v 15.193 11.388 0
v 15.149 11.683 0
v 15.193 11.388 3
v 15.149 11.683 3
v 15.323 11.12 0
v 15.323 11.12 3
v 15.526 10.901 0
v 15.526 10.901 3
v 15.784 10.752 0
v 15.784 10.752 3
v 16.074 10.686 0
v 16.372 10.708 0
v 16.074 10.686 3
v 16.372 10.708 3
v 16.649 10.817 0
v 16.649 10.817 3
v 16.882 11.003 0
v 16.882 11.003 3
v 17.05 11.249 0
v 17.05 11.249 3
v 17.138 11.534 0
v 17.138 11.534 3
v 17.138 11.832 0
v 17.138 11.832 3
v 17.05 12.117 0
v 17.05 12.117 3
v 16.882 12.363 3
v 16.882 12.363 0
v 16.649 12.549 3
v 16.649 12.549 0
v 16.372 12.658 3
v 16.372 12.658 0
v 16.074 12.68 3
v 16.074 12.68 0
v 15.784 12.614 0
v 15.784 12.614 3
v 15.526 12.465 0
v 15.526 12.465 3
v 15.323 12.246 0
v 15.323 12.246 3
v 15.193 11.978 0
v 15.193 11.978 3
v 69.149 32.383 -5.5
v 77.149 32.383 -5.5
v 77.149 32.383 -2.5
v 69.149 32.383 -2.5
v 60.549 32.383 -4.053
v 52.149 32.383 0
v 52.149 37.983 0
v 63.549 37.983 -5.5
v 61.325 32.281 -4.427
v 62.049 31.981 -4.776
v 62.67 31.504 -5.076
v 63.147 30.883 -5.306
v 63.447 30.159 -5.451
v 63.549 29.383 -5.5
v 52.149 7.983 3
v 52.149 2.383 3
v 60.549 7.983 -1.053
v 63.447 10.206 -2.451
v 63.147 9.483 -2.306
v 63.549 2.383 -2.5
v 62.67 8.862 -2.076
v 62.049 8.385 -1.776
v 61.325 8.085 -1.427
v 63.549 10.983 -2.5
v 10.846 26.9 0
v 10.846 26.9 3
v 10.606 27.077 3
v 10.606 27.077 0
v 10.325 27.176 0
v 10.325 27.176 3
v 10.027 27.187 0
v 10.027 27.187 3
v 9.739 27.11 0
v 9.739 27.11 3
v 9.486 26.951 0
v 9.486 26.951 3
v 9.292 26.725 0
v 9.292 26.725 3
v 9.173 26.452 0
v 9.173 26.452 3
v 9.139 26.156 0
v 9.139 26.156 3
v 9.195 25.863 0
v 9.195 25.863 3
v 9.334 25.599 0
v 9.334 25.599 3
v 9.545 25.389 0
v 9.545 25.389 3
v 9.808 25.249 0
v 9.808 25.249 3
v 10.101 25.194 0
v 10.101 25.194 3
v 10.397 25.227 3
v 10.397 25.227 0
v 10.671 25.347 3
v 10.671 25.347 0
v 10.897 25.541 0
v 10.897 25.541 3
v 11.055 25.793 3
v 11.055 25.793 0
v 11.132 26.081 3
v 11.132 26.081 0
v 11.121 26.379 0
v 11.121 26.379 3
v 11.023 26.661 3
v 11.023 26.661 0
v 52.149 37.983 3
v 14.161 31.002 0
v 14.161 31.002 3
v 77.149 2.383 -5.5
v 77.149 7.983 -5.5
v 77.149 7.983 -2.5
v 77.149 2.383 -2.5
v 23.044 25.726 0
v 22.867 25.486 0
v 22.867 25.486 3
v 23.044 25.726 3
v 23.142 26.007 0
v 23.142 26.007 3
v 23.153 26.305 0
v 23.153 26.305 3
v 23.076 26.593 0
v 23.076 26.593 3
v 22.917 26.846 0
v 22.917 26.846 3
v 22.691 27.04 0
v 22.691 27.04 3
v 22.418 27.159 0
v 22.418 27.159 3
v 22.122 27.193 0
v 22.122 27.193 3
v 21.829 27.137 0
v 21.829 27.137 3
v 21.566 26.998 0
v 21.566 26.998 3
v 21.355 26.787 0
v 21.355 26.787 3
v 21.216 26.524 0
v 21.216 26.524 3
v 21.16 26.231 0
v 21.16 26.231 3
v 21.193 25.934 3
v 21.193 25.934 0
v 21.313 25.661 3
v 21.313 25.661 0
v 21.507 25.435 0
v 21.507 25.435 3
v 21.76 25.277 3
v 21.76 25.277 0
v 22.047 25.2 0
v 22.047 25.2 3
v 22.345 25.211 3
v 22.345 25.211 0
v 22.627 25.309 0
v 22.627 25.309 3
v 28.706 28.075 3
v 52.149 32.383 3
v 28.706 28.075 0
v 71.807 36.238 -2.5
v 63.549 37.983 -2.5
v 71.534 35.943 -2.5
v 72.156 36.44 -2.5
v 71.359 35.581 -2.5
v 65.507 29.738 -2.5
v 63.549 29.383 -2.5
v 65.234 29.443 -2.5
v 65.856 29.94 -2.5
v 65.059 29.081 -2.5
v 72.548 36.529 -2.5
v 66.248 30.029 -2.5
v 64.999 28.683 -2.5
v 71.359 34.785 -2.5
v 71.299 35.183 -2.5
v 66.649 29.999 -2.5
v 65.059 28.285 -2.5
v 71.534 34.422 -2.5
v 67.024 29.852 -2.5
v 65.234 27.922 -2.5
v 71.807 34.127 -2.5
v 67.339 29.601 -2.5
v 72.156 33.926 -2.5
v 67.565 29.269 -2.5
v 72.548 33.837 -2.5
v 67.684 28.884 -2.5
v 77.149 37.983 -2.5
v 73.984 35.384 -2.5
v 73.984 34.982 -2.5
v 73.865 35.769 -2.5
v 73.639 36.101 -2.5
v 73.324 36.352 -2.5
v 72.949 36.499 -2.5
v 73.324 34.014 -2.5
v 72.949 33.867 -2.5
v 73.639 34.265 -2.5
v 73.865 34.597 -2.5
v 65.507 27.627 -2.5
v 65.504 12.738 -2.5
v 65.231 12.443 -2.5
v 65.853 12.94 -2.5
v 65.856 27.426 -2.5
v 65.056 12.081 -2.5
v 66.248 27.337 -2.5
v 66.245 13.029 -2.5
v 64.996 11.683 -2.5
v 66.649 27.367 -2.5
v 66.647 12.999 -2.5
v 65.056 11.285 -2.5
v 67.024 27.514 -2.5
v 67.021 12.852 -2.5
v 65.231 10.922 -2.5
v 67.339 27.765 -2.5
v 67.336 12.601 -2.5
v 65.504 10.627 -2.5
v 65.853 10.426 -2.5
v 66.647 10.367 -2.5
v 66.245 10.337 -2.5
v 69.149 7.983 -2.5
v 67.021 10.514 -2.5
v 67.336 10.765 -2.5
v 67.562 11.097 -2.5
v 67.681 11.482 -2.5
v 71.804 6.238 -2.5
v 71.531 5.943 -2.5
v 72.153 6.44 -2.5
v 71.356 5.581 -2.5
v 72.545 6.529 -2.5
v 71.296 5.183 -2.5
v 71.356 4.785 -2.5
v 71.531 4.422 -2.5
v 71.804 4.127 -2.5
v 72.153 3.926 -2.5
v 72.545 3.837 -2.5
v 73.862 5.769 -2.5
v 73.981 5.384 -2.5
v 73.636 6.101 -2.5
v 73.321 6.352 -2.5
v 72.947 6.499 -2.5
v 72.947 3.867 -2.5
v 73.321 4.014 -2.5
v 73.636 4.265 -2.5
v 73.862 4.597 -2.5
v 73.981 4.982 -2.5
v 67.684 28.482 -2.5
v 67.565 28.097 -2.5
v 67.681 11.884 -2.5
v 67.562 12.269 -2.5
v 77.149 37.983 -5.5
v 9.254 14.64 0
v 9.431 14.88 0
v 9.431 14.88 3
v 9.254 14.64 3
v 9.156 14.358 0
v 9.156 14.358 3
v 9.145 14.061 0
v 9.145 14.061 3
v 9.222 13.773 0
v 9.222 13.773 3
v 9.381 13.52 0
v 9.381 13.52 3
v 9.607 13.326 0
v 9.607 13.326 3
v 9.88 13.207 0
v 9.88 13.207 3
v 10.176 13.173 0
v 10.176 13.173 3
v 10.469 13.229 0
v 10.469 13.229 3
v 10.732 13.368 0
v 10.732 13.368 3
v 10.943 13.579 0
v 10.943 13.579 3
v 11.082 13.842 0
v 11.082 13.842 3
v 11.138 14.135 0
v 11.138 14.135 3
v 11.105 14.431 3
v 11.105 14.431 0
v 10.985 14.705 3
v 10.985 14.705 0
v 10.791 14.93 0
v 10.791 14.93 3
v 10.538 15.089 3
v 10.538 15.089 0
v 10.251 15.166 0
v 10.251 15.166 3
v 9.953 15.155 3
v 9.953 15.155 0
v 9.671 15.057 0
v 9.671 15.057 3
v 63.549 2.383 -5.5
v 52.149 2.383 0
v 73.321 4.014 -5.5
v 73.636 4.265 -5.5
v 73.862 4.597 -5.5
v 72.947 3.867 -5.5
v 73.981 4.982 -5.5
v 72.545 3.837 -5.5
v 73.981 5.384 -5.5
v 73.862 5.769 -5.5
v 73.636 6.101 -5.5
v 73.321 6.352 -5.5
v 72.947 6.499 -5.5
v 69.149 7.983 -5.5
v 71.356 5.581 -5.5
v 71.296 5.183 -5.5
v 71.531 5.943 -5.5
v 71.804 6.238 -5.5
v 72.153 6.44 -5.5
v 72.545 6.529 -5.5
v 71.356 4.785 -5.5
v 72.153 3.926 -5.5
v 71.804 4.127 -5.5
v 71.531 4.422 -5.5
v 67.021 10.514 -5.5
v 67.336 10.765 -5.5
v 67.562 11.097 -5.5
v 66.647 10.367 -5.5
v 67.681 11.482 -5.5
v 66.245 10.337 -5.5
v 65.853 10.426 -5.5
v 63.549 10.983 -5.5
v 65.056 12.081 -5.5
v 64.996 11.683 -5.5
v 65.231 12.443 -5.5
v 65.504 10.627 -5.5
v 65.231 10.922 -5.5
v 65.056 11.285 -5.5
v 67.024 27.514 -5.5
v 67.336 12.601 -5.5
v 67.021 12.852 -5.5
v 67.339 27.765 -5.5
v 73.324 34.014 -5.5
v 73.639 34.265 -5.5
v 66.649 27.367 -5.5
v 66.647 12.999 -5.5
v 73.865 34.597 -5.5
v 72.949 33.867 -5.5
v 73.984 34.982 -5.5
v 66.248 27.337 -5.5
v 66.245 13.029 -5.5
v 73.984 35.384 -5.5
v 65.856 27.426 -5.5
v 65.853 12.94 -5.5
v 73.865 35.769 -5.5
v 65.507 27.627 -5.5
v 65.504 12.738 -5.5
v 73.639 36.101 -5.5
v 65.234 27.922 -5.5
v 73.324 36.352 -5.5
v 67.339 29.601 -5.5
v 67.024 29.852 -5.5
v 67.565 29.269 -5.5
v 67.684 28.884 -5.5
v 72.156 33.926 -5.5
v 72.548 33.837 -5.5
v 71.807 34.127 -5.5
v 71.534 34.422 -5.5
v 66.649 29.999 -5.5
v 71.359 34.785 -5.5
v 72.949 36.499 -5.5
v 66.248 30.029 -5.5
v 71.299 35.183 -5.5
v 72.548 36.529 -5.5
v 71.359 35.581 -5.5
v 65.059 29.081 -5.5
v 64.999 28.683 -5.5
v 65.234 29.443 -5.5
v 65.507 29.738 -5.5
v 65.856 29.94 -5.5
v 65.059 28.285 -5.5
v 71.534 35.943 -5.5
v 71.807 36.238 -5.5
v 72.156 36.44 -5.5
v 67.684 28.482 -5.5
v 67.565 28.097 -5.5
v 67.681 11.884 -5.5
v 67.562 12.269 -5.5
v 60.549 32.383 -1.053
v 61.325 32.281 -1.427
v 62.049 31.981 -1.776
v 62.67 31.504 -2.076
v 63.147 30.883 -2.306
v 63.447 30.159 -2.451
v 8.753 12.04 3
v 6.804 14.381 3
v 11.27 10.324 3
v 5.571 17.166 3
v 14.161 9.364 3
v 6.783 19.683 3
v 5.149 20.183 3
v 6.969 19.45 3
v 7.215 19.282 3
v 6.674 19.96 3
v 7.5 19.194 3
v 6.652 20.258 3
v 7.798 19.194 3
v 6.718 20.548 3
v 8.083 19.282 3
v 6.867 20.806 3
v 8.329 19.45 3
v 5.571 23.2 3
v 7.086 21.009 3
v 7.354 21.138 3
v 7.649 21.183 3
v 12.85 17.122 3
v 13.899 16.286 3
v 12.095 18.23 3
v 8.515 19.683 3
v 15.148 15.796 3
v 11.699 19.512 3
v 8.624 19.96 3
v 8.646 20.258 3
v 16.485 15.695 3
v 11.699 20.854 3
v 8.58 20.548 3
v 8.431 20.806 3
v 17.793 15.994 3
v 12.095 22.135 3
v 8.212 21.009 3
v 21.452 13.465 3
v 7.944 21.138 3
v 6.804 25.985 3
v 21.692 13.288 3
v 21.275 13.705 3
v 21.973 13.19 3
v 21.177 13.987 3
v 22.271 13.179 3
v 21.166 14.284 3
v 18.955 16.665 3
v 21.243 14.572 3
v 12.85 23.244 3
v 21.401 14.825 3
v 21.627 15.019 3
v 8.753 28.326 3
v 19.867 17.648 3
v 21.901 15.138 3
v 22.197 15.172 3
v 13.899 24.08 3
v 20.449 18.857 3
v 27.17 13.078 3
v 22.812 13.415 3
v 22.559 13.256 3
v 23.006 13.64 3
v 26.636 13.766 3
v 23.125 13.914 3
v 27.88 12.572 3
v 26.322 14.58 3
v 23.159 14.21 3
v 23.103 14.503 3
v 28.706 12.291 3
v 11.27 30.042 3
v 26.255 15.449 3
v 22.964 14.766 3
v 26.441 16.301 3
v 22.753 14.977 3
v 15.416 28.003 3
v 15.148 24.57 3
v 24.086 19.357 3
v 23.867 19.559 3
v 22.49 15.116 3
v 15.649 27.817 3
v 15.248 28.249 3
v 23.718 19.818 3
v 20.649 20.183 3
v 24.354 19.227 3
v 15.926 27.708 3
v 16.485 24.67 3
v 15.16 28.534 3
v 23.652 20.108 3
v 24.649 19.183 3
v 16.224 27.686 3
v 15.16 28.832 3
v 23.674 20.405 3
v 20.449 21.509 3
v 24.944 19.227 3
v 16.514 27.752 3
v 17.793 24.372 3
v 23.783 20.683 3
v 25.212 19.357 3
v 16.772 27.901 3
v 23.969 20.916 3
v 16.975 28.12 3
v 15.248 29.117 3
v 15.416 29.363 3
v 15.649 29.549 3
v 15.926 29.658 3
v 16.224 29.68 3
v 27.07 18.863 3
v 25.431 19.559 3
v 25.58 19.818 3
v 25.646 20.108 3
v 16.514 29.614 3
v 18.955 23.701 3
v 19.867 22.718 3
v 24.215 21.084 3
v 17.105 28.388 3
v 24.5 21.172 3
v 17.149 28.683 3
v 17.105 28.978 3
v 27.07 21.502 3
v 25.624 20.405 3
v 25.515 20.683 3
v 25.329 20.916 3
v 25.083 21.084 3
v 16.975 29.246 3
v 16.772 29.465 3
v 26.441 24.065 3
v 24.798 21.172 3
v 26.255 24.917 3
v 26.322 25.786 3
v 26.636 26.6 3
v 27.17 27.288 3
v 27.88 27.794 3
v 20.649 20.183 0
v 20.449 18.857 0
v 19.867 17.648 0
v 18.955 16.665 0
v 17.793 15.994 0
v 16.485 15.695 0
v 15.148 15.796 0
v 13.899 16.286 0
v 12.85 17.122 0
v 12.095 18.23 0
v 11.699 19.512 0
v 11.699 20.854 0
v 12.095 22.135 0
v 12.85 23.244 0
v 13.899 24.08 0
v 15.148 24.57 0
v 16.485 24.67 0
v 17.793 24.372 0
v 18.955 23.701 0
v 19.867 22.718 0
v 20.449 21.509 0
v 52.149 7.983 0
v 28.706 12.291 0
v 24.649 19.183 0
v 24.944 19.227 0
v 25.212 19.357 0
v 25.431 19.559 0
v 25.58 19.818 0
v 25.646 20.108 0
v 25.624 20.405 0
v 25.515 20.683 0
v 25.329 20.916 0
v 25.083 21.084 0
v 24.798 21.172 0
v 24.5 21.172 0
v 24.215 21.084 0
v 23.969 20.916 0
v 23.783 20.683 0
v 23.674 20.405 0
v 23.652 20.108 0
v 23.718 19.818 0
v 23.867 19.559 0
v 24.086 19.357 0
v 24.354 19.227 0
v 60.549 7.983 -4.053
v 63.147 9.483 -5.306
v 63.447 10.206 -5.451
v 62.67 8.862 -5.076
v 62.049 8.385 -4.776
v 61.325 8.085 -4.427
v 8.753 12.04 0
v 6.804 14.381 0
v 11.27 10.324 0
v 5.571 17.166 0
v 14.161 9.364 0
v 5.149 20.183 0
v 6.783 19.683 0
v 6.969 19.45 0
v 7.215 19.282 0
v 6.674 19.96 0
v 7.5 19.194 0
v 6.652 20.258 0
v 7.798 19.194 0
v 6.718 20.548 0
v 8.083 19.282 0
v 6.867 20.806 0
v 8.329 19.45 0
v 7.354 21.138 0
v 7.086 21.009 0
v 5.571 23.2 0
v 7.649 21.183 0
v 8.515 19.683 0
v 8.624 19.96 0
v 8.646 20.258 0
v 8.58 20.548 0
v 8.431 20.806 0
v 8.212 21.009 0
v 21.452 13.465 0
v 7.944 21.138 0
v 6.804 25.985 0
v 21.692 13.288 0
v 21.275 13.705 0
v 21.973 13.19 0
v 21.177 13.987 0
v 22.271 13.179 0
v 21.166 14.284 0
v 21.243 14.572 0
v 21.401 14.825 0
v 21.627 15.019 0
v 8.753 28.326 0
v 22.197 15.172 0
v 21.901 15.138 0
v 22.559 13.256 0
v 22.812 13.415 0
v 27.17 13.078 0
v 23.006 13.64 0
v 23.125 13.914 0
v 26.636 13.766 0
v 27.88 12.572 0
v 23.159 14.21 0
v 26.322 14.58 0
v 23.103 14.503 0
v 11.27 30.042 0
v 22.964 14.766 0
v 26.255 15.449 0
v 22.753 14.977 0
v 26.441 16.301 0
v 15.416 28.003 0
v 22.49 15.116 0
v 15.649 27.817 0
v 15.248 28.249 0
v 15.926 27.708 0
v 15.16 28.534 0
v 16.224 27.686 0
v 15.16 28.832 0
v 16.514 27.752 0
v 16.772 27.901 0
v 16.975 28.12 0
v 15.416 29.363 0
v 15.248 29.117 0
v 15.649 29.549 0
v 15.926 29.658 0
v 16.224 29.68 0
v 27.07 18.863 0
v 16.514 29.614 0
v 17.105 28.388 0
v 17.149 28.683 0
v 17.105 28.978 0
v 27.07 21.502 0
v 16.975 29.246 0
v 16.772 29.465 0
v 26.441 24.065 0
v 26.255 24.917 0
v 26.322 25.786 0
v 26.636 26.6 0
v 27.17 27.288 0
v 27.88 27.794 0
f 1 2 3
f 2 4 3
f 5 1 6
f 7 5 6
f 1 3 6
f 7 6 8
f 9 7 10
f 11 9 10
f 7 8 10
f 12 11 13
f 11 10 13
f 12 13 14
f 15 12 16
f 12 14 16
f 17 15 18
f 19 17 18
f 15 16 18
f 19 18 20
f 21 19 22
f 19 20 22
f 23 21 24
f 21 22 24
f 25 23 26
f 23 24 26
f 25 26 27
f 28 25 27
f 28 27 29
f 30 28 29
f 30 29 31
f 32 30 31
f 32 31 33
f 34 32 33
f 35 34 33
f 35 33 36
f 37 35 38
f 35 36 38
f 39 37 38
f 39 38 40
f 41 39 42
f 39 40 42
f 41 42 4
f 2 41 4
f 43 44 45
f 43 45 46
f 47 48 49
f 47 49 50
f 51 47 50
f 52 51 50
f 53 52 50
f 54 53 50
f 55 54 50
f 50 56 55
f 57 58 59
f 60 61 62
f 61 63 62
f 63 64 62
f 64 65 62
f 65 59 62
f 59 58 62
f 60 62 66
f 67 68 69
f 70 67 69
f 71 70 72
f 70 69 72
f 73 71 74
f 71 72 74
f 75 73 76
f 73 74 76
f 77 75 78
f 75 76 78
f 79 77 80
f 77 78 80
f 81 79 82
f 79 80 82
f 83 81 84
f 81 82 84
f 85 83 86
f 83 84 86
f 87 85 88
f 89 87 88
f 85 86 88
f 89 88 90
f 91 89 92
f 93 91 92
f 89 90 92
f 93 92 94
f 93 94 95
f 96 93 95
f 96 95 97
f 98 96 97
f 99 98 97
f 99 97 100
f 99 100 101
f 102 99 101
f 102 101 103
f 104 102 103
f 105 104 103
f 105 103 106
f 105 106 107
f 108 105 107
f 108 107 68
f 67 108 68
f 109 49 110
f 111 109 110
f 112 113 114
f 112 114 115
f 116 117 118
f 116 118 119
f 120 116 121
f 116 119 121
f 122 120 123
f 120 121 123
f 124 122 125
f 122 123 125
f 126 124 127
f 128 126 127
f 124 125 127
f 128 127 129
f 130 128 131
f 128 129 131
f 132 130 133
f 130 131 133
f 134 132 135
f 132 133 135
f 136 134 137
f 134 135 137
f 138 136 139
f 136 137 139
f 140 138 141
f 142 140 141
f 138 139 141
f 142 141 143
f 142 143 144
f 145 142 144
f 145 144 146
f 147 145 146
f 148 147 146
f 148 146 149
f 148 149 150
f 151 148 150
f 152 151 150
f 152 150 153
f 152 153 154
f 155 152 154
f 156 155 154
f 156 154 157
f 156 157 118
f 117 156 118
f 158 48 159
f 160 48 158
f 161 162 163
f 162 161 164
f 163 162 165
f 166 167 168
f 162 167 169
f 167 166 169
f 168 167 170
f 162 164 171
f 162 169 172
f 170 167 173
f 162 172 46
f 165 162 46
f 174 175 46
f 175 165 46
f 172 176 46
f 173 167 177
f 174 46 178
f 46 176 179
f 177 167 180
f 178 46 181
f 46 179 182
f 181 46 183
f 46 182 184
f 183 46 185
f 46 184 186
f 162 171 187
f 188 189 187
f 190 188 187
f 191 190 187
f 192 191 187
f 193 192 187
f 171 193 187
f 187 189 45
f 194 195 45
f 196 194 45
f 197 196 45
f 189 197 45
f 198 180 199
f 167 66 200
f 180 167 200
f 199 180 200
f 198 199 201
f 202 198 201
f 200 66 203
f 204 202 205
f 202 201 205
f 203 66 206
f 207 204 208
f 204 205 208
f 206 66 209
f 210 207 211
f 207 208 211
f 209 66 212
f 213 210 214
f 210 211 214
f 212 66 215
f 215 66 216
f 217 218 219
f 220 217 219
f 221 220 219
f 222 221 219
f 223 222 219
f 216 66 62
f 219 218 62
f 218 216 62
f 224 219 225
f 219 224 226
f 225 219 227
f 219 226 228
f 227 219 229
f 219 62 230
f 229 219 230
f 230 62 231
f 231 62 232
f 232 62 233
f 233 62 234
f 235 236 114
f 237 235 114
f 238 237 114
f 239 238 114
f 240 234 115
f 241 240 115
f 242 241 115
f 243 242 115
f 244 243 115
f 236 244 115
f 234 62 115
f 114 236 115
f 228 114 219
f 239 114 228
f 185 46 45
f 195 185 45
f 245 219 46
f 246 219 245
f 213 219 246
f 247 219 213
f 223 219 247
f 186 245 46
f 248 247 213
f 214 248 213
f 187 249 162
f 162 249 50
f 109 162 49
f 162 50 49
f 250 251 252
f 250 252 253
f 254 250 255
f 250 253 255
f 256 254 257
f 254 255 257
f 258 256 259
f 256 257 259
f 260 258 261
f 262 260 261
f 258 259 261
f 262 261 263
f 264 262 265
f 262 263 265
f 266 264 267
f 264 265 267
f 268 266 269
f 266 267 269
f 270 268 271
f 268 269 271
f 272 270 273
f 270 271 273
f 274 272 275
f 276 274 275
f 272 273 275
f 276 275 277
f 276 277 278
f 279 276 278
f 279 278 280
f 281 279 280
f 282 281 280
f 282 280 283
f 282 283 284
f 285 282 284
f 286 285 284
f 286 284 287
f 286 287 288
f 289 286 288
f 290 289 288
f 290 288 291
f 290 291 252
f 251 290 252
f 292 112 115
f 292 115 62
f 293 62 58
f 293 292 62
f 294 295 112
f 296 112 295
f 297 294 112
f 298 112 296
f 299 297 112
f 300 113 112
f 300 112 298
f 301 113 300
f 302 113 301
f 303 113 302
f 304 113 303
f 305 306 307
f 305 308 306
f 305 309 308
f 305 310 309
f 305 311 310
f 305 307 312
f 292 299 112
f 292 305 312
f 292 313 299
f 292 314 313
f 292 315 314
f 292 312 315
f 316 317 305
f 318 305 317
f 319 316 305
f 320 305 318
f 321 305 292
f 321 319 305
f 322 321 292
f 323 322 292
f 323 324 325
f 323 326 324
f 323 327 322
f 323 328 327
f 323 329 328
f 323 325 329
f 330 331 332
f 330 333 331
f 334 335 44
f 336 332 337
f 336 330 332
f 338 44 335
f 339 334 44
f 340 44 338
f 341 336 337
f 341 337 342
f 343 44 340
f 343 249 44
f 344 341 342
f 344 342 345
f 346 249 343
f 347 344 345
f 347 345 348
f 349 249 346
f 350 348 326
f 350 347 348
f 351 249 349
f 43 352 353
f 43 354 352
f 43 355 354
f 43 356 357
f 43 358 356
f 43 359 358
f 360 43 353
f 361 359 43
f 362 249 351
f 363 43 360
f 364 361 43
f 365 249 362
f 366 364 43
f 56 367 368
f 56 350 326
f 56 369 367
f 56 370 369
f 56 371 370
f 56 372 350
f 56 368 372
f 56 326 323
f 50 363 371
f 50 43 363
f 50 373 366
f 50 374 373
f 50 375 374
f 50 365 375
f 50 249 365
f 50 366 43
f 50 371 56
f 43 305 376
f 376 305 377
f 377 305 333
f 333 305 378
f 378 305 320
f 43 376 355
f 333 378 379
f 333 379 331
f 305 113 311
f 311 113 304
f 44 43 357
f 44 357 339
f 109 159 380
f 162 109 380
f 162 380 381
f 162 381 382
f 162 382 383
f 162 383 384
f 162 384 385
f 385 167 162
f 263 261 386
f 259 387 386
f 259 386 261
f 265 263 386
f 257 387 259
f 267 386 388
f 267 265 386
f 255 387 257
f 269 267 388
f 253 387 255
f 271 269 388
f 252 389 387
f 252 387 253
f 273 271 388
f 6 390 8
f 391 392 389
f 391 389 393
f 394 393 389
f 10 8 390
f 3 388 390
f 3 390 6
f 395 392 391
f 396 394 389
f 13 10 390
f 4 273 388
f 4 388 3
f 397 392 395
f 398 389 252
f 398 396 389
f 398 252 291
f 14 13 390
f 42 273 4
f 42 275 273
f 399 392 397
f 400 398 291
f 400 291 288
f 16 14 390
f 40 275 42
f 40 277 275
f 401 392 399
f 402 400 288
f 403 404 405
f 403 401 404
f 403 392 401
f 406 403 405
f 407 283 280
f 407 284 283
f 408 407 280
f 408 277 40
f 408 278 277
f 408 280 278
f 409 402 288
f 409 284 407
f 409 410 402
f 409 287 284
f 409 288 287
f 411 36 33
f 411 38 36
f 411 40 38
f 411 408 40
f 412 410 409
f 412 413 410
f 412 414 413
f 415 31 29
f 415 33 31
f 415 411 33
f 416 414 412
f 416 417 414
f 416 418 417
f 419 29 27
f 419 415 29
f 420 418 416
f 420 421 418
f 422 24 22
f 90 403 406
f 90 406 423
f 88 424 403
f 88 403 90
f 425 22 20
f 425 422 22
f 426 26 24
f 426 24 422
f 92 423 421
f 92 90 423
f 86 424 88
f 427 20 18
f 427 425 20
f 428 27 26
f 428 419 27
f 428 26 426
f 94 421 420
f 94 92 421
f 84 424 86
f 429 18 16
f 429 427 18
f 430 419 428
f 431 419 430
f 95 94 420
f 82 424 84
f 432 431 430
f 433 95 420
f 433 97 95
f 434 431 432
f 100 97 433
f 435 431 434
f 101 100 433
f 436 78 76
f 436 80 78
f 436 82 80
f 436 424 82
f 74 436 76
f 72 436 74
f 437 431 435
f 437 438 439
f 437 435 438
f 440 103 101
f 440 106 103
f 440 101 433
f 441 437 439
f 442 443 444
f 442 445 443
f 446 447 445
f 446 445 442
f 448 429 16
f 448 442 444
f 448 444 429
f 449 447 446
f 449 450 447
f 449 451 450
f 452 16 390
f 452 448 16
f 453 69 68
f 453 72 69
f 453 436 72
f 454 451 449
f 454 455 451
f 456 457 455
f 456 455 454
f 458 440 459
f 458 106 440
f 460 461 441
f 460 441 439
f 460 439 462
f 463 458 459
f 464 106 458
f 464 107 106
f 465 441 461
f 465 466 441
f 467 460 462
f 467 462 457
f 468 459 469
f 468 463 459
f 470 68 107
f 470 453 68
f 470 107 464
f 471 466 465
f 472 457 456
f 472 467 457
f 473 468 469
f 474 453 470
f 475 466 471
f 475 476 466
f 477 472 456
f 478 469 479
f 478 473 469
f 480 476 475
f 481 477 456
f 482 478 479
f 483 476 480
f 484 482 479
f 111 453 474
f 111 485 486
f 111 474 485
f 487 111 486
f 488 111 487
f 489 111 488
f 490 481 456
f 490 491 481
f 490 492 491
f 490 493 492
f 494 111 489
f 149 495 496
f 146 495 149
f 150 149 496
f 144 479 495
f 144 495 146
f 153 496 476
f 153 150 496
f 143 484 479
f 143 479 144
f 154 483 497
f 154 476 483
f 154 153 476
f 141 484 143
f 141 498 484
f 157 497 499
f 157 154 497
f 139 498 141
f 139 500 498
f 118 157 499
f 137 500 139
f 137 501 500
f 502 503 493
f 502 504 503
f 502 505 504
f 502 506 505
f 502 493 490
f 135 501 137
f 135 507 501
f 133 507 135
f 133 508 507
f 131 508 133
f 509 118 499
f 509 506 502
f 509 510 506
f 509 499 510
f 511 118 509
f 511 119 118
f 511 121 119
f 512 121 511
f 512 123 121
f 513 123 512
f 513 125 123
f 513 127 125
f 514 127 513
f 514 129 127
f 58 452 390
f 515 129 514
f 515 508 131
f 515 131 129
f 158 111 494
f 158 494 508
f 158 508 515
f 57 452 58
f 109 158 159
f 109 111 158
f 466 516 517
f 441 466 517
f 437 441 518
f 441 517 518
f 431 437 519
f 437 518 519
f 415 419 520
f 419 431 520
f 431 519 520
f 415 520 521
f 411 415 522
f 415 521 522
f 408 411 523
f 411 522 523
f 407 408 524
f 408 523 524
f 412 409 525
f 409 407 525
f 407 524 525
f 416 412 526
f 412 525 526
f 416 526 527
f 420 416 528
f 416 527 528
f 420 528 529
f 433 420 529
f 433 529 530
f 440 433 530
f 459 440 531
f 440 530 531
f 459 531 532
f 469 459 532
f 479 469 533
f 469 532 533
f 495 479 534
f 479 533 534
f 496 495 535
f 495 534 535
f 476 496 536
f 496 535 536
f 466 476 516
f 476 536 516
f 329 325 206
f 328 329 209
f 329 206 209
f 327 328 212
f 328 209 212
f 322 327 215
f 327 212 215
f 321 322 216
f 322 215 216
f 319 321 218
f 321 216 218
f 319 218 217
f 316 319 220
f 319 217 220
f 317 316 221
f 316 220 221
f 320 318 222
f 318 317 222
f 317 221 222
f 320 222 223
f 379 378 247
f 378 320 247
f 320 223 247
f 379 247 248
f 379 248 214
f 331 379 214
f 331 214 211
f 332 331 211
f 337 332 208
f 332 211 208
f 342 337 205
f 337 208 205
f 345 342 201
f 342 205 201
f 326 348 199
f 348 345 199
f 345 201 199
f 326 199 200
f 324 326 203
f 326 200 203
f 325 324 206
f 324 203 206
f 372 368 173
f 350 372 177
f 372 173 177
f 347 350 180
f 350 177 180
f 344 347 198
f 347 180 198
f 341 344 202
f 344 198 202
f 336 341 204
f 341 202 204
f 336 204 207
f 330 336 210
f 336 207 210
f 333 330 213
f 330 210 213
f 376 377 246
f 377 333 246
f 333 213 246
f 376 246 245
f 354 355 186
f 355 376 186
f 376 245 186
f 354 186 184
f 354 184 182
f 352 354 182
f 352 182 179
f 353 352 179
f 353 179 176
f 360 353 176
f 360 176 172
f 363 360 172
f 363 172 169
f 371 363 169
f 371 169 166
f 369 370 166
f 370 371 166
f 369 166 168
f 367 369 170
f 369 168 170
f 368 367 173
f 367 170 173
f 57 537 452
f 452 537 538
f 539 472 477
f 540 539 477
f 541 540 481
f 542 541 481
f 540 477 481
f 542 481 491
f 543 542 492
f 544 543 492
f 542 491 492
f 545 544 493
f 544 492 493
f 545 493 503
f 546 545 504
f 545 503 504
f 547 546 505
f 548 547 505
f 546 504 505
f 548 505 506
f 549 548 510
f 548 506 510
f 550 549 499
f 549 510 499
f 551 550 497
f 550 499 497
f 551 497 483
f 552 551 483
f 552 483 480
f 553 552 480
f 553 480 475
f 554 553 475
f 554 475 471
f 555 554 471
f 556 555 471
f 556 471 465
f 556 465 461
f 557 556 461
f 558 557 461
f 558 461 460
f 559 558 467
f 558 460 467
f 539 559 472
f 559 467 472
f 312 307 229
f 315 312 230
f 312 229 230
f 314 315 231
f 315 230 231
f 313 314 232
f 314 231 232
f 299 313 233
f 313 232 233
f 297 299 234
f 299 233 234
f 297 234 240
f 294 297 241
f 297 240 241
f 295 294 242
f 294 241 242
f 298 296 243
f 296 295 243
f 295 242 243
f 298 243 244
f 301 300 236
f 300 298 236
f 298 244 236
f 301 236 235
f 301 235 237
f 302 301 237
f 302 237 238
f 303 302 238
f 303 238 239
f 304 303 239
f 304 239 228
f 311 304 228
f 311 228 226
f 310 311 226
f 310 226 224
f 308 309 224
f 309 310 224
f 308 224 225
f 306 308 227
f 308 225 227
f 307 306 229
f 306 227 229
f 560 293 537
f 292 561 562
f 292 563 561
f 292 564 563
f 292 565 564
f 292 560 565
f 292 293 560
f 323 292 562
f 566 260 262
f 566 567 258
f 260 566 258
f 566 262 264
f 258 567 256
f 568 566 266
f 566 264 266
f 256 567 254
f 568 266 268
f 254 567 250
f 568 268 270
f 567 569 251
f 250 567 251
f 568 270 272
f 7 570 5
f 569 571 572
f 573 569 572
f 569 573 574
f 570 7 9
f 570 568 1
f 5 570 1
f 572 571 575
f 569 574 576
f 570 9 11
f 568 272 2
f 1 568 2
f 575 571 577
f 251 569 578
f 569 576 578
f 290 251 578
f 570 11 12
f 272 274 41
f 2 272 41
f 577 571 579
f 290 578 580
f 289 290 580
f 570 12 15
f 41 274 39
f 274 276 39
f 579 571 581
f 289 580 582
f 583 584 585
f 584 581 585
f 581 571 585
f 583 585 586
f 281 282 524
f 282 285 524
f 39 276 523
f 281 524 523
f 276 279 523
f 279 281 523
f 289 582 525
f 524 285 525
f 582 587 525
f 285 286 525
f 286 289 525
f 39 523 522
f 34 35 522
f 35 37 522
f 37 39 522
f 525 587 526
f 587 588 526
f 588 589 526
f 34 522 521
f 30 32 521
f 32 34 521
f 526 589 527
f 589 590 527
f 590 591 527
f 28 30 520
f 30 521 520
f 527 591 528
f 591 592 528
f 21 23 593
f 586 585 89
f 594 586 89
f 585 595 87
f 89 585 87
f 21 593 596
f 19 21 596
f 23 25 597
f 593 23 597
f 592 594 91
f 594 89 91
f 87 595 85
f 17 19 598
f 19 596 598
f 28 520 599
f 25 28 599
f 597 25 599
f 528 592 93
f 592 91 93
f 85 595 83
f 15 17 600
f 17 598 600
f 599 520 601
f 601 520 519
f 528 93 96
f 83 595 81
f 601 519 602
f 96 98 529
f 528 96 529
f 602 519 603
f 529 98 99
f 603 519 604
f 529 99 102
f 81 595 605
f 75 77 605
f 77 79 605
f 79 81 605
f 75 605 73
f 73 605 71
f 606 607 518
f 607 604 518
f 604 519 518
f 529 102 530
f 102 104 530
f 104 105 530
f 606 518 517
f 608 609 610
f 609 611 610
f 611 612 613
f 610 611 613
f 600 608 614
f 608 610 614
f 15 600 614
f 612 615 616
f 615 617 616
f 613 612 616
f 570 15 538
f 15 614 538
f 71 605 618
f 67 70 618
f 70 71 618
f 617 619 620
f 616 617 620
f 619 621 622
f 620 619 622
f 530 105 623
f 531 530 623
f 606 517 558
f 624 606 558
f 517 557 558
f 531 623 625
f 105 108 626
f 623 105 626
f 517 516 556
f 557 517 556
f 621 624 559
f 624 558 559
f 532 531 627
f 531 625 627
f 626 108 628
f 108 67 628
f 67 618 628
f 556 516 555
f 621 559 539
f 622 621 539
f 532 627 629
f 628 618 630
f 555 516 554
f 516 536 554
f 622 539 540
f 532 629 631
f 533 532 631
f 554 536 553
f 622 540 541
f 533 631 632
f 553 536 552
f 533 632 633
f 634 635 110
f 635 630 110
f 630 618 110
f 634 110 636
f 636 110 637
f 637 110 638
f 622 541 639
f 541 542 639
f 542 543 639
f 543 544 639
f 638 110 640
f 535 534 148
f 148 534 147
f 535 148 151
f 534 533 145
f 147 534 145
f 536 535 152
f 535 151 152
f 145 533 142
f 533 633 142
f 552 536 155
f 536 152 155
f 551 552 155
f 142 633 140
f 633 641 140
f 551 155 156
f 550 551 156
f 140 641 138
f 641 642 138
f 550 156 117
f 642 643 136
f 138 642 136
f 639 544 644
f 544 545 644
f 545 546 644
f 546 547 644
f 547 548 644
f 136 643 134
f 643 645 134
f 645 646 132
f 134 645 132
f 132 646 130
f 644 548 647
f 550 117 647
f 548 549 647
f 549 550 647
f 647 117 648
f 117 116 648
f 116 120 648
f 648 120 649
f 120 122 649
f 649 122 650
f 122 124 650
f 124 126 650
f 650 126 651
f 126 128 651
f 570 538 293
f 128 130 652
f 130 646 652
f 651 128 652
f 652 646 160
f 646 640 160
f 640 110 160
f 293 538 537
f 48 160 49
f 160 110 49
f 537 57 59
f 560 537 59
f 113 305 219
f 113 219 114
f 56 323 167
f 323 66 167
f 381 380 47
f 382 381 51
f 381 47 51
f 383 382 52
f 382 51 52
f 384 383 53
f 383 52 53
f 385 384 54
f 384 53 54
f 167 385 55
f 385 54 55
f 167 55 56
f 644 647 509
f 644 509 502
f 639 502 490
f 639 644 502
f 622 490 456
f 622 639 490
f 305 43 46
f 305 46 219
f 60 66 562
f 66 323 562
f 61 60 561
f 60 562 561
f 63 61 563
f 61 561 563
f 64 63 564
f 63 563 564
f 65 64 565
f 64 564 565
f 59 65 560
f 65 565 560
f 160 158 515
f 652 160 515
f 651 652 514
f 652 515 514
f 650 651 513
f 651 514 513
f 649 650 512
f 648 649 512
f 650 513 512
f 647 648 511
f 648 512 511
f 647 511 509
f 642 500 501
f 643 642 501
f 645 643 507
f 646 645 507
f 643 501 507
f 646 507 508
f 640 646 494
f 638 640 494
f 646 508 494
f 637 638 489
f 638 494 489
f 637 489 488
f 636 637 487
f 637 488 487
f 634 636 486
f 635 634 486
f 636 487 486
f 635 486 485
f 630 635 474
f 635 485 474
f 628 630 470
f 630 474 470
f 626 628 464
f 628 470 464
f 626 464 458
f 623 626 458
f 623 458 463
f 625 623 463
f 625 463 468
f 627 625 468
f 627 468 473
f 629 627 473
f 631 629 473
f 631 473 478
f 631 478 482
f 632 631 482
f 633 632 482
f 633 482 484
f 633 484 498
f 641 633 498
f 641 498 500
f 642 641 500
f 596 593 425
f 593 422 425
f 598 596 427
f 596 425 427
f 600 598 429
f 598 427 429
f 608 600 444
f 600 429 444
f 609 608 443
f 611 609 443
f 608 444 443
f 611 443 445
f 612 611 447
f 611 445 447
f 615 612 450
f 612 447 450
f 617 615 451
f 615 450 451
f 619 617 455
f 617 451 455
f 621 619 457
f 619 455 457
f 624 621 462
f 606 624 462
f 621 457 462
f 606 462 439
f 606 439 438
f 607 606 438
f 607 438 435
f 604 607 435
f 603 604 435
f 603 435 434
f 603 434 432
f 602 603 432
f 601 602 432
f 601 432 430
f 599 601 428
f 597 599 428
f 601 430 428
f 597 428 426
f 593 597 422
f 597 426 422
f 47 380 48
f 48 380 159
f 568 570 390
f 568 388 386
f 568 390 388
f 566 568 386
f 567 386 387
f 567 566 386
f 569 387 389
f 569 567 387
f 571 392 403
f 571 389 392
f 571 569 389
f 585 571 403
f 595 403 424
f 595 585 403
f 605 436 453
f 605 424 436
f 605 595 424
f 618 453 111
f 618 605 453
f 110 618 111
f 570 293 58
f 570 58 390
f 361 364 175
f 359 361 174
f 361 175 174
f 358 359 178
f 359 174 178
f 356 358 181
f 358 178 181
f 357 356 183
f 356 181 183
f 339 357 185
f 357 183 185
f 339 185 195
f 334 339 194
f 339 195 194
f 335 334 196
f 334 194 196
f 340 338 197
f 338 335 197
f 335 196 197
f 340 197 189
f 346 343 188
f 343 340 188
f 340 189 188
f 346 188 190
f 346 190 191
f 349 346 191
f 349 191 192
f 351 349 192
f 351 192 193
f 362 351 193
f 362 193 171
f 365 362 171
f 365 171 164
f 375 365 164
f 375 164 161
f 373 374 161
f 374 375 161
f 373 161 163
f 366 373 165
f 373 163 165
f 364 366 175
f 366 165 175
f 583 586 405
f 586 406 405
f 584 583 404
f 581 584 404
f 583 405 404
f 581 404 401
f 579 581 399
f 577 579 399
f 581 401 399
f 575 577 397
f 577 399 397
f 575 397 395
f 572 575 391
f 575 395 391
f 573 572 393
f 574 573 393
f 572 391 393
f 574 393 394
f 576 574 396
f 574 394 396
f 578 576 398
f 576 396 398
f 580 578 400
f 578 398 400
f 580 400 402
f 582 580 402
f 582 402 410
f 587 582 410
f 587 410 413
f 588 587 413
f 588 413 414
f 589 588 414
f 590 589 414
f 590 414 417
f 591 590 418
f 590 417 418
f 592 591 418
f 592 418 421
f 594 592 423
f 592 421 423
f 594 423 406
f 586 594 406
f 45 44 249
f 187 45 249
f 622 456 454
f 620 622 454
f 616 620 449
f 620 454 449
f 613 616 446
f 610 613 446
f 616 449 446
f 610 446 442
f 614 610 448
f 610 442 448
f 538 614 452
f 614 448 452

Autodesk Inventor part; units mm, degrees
ref_plane "YZ Plane" through (0, 0, 0) normal (1, 0, 0) x (0, 1, 0)
sketch "Sketch1" plane through (0, 0, 0) normal (0, 0, 1) x (1, 0, 0)
  circle A0 centre (66.3461, 11.6829) radius 1.35
  circle A1 centre (66.349, 28.6829) radius 1.35
  circle A2 centre (72.6461, 5.1829) radius 1.35
  circle A3 centre (72.649, 35.1829) radius 1.35
  line L0 (77.149, 32.3829) -> (77.149, 37.9829)
  line L1 (77.149, 7.9829) -> (77.149, 2.3829)
  line L2 (77.149, 32.3829) -> (69.149, 32.3829)
  line L3 (69.149, 32.3829) -> (69.149, 7.9829)
  line L4 (69.149, 7.9829) -> (77.149, 7.9829)
  circle A4 centre (16.149, 20.1829) radius 4.5
  line L5 (77.149, 37.9829) -> (52.149, 37.9829)
  arc A5 (14.1608, 31.0018) -> (14.1608, 9.3641) centre (16.149, 20.1829) ccw
  line L6 (52.149, 37.9829) -> (14.1608, 31.0018)
  line L7 (77.149, 2.3829) -> (52.149, 2.3829)
  line L8 (52.149, 2.3829) -> (14.1608, 9.3641)
  line L9 (63.549, 7.9829) -> (63.549, 32.3829)
  line L10 (63.549, 32.3829) -> (52.149, 32.3829)
  line L11 (52.149, 32.3829) -> (24.5301, 27.3073)
  line L12 (52.149, 7.9829) -> (63.549, 7.9829)
  line L13 (52.149, 7.9829) -> (24.5301, 13.0585)
  arc A6 (24.5301, 13.0585) -> (24.5301, 27.3073) centre (16.149, 20.1829) ccw
  point P0 (0, 0)
  dimension "d2" = 9
  dimension "d26" = 8
  dimension "d27" = 8
  dimension "d29" = 2.8
  dimension "d30" = 6.3
  dimension "d31" = 6.3
  dimension "d32" = 25
  dimension "d33" = 22
  dimension "d34" = 25
  dimension "d43" = 5.6
  dimension "d44" = 5.6
  dimension "d46" = 5.6
  dimension "d47" = 11.4
  dimension "d48" = 11.4
extrude "Extrusion1" add sketch "Sketch1" along normal blind 3
ref_plane "Work Plane1" through (47.9215, -19.8251, -5.5) normal (0, 0, 1) x (1, 0, 0)
sketch "Sketch5" plane through (0, 0, 0) normal (0, 0, -1) x (-1, 0, 0)
  line L0 (-52.149, 7.9829) -> (-63.549, 7.9829) projected
  line L1 (-63.549, 32.3829) -> (-52.149, 32.3829) projected
  circle A0 centre (-72.6461, 5.1829) radius 1.35 projected
  circle A1 centre (-66.349, 28.6829) radius 1.35 projected
  circle A2 centre (-66.3461, 11.6829) radius 1.35 projected
  circle A3 centre (-72.649, 35.1829) radius 1.35 projected
  line L2 (-77.149, 32.3829) -> (-77.149, 37.9829) projected
  line L3 (-77.149, 2.3829) -> (-77.149, 7.9829) projected
  line L4 (-77.149, 37.9829) -> (-52.149, 37.9829) projected
  line L5 (-77.149, 32.3829) -> (-69.149, 32.3829)
  line L6 (-69.149, 32.3829) -> (-69.149, 7.9829)
  line L7 (-69.149, 7.9829) -> (-77.149, 7.9829)
  line L8 (-77.149, 7.9829) -> (-77.149, 2.3829)
  line L9 (-77.149, 2.3829) -> (-52.149, 2.3829)
  line L10 (-52.149, 2.3829) -> (-52.149, 7.9829)
  line L11 (-63.549, 7.9829) -> (-63.549, 32.3829)
  line L12 (-52.149, 32.3829) -> (-52.149, 37.9829)
  line L13 (-63.549, 32.3829) -> (-52.149, 32.3829)
  line L14 (-52.149, 37.9829) -> (-77.149, 37.9829)
  line L15 (-77.149, 32.3829) -> (-77.149, 37.9829)
  circle A4 centre (-72.649, 35.1829) radius 1.35
  circle A5 centre (-66.349, 28.6829) radius 1.35
  circle A6 centre (-66.3461, 11.6829) radius 1.35
  circle A7 centre (-72.6461, 5.1829) radius 1.35
  point P0 (0, 0)
  dimension "d49" = 2.7
  dimension "d50" = 2.7
ref_plane "Work Plane2" through (55.1914, -9.495, -5.5) normal (0, 0, 1) x (1, 0, 0)
extrude "Extrusion5" add sketch "Sketch5" along normal up to surface (5.5 mm away)
sketch "Sketch6" plane through (52.149, 2.3829, 3) normal (0, -1, 0) x (1, 0, 0)
  line L0 (0, -3) -> (0, -8.5) projected
  line L1 (25, -8.5) -> (0, -8.5) projected
  line L2 (25, -8.5) -> (25, 0) projected
  line L3 (0, -3) -> (11.4, -8.5)
  line L4 (11.4, -8.5) -> (0, -8.5)
  line L5 (0, -8.5) -> (0, -3)
  line L6 (0, 0) -> (11.4, -5.5)
  line L7 (11.4, -8.5) -> (11.4, 0) projected
  line L8 (11.4, -5.5) -> (25, -5.5)
  line L9 (25, -8.5) -> (25, 0) projected
  line L10 (25, -5.5) -> (25, 0)
  line L11 (25, 0) -> (17, 0) projected
  line L12 (25, 0) -> (0, 0)
  point P0 (-52.149, -3)
extrude "Extrusion6" cut sketch "Sketch6" against normal through all contours L3 L1 L0 | L6 L12 L7 | L7 L12 L11 L2 L8
fillet "Fillet2" radius 3 4 edges at (63.549, 32.3829, -4) (24.5301, 27.3073, 1.5) (24.5301, 13.0585, 1.5) (63.549, 7.9829, -4)
sketch "Sketch7" plane through (0, 0, 3) normal (0, 0, 1) x (1, 0, 0)
  arc A0 (26.4411, 16.3006) -> (26.4411, 24.0653) centre (16.149, 20.1829) ccw projected
  circle A1 centre (16.149, 28.6829) radius 1
  point P0 (0, 0)
  dimension "d56" = 2
  dimension "d57" = 8.5
extrude "Extrusion7" cut sketch "Sketch7" against normal through all
pattern_circular "Circular Pattern1" count 8 over 360 about axis through (16.149, 20.1829, 0) along (0, 0, 1) of "Extrusion7"
properties part number "Arm" material "Aluminum-6061"
